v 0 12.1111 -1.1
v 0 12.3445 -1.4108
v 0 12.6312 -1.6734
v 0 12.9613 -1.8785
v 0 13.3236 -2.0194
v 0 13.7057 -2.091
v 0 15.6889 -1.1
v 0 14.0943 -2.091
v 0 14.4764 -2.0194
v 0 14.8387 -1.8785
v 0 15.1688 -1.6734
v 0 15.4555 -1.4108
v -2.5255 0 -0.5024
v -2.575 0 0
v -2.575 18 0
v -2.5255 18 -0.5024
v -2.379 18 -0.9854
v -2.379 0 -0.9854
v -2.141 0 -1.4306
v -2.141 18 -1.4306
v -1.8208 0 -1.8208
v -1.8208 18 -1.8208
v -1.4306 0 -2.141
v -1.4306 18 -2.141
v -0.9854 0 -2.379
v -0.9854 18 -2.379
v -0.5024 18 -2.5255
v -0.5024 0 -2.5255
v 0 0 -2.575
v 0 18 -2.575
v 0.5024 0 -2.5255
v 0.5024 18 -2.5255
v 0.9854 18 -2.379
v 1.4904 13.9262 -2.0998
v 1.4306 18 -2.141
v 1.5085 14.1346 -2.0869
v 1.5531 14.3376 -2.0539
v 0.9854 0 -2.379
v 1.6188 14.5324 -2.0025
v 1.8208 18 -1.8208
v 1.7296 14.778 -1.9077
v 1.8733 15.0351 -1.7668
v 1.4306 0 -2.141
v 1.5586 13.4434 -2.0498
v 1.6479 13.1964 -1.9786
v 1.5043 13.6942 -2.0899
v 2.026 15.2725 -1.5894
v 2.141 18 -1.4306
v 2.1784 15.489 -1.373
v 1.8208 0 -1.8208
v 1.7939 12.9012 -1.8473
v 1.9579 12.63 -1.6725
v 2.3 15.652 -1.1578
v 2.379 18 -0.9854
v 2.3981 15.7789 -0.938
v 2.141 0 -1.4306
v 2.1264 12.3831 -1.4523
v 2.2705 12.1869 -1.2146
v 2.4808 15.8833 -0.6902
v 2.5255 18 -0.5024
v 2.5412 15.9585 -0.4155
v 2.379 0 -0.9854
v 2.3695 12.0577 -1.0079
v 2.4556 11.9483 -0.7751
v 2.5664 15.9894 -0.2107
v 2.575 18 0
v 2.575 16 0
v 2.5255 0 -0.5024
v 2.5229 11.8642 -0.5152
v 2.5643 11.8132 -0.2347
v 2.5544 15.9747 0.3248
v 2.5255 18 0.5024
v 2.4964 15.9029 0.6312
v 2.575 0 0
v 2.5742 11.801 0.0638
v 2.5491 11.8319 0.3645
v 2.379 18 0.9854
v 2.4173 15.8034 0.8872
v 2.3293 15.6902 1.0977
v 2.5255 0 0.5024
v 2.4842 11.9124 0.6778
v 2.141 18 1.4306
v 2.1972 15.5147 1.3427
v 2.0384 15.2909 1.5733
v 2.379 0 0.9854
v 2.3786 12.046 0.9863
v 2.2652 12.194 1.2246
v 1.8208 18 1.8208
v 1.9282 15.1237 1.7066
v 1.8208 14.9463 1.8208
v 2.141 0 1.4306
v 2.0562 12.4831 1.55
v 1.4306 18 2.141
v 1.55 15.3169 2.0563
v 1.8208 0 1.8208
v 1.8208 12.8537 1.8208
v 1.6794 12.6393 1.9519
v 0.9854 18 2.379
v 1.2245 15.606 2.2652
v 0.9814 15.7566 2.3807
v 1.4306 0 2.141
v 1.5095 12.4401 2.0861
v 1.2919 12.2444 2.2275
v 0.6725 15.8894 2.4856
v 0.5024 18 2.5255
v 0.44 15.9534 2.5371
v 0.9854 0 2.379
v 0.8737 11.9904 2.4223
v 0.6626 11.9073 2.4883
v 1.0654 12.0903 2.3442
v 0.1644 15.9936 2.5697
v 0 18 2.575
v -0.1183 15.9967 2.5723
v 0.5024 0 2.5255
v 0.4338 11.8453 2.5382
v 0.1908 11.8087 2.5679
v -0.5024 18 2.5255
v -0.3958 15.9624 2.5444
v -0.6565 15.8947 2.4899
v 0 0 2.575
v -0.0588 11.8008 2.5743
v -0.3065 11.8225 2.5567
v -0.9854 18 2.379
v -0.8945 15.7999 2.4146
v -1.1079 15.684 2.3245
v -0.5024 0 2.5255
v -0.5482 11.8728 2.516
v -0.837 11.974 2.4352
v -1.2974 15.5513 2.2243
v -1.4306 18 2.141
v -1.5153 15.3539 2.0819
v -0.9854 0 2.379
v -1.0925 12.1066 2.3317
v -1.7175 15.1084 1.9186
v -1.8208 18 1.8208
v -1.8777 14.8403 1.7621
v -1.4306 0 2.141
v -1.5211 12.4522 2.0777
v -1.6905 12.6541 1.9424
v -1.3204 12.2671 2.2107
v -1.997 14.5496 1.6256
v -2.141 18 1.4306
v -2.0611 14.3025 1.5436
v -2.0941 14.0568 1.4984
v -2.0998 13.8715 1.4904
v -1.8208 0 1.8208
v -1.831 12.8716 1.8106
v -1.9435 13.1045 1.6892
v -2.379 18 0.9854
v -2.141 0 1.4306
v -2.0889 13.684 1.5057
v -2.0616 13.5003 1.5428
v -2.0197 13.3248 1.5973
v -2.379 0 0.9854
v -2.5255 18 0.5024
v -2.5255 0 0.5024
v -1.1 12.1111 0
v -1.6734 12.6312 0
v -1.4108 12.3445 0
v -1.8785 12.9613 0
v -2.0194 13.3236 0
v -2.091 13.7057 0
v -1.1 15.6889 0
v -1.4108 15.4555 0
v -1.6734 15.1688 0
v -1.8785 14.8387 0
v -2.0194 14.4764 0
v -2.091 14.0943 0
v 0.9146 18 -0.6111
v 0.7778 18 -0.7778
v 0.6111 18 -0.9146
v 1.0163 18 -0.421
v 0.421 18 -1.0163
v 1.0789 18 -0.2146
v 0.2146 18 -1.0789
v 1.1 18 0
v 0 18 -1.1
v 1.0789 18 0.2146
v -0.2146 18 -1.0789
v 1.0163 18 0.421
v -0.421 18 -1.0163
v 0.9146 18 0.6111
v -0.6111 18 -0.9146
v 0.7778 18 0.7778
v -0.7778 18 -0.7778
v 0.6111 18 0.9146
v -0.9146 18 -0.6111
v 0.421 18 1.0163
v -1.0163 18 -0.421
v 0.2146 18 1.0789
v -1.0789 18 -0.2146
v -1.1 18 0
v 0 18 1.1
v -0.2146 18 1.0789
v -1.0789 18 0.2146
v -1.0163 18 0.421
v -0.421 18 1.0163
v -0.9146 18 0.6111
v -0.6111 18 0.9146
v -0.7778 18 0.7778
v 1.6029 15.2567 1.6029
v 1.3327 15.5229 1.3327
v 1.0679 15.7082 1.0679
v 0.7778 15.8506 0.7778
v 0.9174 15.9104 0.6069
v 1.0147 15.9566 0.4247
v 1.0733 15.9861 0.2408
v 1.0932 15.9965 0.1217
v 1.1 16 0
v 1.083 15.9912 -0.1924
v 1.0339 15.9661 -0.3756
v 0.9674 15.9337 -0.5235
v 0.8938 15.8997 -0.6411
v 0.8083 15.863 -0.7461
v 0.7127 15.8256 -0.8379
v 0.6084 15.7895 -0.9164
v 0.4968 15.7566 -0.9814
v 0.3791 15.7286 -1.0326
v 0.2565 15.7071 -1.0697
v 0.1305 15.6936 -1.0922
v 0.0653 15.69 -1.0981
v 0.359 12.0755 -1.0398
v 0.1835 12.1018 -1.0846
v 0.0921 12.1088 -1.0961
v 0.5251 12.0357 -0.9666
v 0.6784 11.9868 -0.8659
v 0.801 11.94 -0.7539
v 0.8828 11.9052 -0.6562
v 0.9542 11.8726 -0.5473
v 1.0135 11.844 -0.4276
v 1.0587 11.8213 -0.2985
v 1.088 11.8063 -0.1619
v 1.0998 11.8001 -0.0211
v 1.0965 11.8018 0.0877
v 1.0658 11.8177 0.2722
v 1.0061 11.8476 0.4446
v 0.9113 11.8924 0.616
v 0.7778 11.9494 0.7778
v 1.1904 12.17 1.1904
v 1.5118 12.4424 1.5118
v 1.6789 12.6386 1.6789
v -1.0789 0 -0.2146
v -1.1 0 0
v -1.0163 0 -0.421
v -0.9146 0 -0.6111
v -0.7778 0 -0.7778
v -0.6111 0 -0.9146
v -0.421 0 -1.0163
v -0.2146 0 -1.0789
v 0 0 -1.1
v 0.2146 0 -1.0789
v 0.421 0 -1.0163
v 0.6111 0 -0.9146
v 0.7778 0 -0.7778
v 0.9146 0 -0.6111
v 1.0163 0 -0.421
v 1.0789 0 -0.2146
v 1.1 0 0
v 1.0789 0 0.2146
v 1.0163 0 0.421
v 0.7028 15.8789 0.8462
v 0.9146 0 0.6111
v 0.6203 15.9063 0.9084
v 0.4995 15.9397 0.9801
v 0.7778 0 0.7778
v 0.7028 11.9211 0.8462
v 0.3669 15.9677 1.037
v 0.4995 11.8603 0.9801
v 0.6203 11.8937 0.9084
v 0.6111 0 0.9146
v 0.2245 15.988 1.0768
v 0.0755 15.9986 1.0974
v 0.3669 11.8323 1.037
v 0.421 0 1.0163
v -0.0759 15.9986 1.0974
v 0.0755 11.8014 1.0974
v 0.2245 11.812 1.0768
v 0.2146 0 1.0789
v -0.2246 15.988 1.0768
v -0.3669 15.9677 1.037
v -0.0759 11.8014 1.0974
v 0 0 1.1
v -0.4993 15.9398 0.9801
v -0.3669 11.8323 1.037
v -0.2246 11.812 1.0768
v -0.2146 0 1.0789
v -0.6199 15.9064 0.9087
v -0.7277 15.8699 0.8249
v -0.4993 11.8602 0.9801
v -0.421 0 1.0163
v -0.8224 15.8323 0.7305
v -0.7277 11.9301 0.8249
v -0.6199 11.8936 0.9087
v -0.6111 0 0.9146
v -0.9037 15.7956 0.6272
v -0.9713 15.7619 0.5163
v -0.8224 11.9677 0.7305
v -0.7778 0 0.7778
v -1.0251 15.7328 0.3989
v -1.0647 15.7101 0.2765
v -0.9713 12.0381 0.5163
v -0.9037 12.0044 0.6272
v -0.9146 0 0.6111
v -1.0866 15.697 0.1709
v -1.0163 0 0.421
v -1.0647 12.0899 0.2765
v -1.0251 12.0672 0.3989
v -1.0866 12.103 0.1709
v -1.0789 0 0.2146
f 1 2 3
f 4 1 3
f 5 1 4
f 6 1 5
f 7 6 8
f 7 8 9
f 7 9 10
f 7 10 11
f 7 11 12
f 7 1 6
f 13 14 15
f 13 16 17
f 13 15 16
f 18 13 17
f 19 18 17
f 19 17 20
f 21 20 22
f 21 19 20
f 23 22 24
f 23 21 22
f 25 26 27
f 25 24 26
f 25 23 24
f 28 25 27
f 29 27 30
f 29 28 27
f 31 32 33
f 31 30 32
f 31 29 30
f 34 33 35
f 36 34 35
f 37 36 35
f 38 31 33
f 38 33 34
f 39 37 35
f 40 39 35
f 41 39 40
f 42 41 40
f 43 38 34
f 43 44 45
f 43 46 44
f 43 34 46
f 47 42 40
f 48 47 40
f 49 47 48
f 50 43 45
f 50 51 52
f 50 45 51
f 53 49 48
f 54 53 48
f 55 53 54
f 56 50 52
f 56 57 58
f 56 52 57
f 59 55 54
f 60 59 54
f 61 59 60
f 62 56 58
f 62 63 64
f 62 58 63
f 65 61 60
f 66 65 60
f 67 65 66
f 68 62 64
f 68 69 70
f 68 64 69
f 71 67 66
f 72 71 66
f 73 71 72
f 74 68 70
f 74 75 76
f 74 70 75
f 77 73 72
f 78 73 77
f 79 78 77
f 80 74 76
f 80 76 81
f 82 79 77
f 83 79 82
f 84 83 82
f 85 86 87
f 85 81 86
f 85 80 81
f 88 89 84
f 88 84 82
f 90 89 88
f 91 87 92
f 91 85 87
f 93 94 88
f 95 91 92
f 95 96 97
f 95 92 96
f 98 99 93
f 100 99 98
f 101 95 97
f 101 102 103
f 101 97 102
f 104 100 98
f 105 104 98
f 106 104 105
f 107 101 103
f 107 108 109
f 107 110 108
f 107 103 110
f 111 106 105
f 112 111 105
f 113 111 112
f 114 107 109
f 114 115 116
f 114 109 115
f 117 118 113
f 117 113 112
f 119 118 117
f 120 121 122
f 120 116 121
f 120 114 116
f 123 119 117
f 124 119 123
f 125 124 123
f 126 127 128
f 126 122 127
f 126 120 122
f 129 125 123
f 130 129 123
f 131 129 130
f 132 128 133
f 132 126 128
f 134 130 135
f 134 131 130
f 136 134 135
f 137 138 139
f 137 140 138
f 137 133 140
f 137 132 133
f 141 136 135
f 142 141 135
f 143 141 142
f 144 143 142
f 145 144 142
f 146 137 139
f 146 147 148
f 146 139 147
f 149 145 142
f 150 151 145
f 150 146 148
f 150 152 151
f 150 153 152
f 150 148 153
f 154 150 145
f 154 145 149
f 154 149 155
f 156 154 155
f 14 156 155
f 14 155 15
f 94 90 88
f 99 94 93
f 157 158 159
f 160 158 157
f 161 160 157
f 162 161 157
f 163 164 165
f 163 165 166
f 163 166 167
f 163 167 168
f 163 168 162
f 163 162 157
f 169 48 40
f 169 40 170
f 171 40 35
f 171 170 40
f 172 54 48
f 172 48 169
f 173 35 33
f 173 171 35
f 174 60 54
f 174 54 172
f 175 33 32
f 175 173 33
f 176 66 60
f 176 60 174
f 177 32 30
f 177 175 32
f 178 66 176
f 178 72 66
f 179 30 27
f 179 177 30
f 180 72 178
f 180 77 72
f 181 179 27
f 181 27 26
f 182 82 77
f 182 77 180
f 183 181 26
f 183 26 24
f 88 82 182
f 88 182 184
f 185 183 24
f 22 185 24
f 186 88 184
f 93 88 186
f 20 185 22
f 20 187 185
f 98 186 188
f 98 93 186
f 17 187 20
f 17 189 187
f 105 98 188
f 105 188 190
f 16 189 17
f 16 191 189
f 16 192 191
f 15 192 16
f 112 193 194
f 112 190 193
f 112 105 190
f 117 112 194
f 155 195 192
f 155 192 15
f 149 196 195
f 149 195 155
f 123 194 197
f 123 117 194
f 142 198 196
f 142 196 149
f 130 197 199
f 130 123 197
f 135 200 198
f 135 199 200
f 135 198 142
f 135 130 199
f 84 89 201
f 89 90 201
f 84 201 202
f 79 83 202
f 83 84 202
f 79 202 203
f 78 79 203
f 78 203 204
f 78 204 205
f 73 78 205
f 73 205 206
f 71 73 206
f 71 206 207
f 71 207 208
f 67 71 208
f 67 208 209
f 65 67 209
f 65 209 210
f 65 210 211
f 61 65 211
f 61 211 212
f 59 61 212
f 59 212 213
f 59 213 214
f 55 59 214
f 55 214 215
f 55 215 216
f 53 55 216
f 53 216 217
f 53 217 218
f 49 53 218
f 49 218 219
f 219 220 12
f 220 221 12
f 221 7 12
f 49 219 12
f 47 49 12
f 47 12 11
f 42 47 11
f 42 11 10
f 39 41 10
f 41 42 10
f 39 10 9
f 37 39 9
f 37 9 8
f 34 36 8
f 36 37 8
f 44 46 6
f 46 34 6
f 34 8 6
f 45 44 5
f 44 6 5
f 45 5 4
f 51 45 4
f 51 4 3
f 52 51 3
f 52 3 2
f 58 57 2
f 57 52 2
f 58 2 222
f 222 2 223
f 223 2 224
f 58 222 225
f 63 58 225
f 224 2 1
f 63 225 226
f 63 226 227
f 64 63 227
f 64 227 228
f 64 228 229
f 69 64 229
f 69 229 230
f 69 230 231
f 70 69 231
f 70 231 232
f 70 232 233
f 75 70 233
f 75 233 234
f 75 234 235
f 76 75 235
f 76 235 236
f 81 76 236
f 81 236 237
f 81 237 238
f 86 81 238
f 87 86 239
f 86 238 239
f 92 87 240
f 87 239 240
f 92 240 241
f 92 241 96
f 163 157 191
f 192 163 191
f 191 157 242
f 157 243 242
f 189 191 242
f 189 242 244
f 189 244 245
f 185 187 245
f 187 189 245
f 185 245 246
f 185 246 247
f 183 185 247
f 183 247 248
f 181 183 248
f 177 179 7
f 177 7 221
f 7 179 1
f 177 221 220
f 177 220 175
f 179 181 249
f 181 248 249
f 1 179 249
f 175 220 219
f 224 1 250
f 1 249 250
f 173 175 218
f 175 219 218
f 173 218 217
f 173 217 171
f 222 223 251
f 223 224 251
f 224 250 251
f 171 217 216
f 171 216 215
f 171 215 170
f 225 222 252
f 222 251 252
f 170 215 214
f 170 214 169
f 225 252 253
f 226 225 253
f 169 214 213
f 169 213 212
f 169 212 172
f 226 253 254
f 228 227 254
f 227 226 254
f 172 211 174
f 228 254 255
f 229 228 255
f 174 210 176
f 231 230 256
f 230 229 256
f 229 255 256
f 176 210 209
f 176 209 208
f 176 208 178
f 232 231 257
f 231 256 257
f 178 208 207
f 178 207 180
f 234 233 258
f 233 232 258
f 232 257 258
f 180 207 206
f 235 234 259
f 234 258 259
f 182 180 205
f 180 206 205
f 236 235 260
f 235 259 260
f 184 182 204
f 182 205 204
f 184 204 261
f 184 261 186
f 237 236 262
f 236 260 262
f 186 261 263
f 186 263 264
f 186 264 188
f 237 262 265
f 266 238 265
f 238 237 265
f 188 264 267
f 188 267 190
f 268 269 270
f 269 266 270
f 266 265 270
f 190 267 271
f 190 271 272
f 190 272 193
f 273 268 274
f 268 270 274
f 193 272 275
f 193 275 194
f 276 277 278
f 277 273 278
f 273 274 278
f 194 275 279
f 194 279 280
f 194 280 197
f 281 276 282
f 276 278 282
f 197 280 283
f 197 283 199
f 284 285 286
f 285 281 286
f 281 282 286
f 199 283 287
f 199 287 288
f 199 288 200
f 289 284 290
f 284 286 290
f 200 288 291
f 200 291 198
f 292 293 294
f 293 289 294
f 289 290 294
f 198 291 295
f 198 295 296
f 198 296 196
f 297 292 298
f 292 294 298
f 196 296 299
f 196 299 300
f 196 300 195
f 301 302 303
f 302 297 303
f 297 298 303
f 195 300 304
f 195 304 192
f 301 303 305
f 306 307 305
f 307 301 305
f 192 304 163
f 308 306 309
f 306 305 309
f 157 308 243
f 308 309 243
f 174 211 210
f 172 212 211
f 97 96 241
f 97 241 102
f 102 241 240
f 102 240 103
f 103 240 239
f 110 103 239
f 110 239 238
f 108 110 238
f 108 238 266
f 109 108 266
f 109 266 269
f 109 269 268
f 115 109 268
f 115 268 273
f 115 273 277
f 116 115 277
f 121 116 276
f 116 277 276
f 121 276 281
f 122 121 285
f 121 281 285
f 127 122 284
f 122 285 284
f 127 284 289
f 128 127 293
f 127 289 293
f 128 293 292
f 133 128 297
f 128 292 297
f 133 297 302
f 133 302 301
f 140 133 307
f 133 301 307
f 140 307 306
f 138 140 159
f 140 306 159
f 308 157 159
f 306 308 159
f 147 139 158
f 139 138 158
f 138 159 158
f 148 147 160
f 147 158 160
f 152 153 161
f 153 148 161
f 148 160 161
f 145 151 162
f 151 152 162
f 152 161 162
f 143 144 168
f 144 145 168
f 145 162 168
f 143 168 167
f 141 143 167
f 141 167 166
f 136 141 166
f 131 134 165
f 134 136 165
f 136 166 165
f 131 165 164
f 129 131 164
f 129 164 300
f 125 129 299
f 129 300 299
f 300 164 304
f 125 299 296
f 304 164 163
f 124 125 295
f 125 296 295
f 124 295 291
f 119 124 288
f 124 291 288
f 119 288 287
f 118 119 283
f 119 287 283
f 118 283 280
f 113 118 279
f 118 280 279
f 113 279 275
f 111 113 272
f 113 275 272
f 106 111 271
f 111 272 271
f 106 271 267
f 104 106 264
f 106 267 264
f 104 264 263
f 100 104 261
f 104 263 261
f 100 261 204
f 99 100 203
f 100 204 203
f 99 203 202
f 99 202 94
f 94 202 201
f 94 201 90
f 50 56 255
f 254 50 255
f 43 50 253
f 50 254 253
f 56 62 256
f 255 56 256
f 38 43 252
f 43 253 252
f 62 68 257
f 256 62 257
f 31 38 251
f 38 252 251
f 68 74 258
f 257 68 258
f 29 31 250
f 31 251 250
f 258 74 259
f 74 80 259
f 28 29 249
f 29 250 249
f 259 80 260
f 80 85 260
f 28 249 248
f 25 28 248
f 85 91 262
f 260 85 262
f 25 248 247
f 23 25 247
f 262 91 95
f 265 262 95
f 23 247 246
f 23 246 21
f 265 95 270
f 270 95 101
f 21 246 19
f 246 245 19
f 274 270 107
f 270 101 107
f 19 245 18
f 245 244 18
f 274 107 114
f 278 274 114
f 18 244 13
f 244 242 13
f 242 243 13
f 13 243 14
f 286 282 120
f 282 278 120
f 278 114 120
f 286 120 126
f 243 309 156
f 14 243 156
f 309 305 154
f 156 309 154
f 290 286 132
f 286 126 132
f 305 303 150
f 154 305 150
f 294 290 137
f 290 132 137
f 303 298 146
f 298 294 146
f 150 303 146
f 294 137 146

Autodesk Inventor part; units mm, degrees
ref_plane "XZ Plane" through (0, 0, 0) normal (0, 1, 0) x (-1, 0, 0)
ref_plane "XY Plane" through (0, 0, 0) normal (0, 0, 1) x (1, 0, 0)
sketch "Sketch1" plane through (0, 0, 0) normal (0, 1, 0) x (-1, 0, 0)
  circle A0 centre (0, 0) radius 1.1
  circle A1 centre (0, 0) radius 2.575
  dimension "d0" = 2.2
  dimension "d1" = 5.15
extrude "Extrusion1" add sketch "Sketch1" along normal blind 18
sketch "Sketch2" plane through (0, 0, 0) normal (0, 0, 1) x (1, 0, 0)
  line L0 (2.575, 18) -> (-2.575, 18) projected
  line L1 (2.575, 0) -> (-2.575, 0) projected
  line L2 (-2.575, 0) -> (-2.575, 18) projected
  line L3 (-2.575, 16) -> (2.5173, 16)
  line L4 (2.575, 18) -> (-2.575, 18) projected
  line L5 (0, 18) -> (0, 0)
  circle A0 centre (0, 13.9) radius 2.1
  dimension "d4" = 2
  dimension "d5" = 4.2
extrude "Extrusion2" cut sketch "Sketch2" along normal blind 12 contours A0 L5 | L5 A0
sketch "Sketch3" plane through (0, 0, 0) normal (1, 0, 0) x (0, 1, 0)
  line L0 (18, -2.575) -> (18, 2.575) projected
  line L1 (0, -2.575) -> (0, 2.575) projected
  line L2 (0, 2.575) -> (18, 2.575) projected
  line L3 (16, 2.575) -> (16, -2.525)
  line L4 (18, 1.1) -> (18, -1.1) projected
  line L5 (18, 0) -> (0, 0)
  circle A0 centre (13.9, 0) radius 2.1
  point P0 (13.9, 1.4902)
  dimension "d8" = 2
  dimension "d9" = 4.2
extrude "Extrusion3" cut sketch "Sketch3" along normal up to next contours A0 L5 | L5 A0
properties part number "motor_shaft_adapter"
